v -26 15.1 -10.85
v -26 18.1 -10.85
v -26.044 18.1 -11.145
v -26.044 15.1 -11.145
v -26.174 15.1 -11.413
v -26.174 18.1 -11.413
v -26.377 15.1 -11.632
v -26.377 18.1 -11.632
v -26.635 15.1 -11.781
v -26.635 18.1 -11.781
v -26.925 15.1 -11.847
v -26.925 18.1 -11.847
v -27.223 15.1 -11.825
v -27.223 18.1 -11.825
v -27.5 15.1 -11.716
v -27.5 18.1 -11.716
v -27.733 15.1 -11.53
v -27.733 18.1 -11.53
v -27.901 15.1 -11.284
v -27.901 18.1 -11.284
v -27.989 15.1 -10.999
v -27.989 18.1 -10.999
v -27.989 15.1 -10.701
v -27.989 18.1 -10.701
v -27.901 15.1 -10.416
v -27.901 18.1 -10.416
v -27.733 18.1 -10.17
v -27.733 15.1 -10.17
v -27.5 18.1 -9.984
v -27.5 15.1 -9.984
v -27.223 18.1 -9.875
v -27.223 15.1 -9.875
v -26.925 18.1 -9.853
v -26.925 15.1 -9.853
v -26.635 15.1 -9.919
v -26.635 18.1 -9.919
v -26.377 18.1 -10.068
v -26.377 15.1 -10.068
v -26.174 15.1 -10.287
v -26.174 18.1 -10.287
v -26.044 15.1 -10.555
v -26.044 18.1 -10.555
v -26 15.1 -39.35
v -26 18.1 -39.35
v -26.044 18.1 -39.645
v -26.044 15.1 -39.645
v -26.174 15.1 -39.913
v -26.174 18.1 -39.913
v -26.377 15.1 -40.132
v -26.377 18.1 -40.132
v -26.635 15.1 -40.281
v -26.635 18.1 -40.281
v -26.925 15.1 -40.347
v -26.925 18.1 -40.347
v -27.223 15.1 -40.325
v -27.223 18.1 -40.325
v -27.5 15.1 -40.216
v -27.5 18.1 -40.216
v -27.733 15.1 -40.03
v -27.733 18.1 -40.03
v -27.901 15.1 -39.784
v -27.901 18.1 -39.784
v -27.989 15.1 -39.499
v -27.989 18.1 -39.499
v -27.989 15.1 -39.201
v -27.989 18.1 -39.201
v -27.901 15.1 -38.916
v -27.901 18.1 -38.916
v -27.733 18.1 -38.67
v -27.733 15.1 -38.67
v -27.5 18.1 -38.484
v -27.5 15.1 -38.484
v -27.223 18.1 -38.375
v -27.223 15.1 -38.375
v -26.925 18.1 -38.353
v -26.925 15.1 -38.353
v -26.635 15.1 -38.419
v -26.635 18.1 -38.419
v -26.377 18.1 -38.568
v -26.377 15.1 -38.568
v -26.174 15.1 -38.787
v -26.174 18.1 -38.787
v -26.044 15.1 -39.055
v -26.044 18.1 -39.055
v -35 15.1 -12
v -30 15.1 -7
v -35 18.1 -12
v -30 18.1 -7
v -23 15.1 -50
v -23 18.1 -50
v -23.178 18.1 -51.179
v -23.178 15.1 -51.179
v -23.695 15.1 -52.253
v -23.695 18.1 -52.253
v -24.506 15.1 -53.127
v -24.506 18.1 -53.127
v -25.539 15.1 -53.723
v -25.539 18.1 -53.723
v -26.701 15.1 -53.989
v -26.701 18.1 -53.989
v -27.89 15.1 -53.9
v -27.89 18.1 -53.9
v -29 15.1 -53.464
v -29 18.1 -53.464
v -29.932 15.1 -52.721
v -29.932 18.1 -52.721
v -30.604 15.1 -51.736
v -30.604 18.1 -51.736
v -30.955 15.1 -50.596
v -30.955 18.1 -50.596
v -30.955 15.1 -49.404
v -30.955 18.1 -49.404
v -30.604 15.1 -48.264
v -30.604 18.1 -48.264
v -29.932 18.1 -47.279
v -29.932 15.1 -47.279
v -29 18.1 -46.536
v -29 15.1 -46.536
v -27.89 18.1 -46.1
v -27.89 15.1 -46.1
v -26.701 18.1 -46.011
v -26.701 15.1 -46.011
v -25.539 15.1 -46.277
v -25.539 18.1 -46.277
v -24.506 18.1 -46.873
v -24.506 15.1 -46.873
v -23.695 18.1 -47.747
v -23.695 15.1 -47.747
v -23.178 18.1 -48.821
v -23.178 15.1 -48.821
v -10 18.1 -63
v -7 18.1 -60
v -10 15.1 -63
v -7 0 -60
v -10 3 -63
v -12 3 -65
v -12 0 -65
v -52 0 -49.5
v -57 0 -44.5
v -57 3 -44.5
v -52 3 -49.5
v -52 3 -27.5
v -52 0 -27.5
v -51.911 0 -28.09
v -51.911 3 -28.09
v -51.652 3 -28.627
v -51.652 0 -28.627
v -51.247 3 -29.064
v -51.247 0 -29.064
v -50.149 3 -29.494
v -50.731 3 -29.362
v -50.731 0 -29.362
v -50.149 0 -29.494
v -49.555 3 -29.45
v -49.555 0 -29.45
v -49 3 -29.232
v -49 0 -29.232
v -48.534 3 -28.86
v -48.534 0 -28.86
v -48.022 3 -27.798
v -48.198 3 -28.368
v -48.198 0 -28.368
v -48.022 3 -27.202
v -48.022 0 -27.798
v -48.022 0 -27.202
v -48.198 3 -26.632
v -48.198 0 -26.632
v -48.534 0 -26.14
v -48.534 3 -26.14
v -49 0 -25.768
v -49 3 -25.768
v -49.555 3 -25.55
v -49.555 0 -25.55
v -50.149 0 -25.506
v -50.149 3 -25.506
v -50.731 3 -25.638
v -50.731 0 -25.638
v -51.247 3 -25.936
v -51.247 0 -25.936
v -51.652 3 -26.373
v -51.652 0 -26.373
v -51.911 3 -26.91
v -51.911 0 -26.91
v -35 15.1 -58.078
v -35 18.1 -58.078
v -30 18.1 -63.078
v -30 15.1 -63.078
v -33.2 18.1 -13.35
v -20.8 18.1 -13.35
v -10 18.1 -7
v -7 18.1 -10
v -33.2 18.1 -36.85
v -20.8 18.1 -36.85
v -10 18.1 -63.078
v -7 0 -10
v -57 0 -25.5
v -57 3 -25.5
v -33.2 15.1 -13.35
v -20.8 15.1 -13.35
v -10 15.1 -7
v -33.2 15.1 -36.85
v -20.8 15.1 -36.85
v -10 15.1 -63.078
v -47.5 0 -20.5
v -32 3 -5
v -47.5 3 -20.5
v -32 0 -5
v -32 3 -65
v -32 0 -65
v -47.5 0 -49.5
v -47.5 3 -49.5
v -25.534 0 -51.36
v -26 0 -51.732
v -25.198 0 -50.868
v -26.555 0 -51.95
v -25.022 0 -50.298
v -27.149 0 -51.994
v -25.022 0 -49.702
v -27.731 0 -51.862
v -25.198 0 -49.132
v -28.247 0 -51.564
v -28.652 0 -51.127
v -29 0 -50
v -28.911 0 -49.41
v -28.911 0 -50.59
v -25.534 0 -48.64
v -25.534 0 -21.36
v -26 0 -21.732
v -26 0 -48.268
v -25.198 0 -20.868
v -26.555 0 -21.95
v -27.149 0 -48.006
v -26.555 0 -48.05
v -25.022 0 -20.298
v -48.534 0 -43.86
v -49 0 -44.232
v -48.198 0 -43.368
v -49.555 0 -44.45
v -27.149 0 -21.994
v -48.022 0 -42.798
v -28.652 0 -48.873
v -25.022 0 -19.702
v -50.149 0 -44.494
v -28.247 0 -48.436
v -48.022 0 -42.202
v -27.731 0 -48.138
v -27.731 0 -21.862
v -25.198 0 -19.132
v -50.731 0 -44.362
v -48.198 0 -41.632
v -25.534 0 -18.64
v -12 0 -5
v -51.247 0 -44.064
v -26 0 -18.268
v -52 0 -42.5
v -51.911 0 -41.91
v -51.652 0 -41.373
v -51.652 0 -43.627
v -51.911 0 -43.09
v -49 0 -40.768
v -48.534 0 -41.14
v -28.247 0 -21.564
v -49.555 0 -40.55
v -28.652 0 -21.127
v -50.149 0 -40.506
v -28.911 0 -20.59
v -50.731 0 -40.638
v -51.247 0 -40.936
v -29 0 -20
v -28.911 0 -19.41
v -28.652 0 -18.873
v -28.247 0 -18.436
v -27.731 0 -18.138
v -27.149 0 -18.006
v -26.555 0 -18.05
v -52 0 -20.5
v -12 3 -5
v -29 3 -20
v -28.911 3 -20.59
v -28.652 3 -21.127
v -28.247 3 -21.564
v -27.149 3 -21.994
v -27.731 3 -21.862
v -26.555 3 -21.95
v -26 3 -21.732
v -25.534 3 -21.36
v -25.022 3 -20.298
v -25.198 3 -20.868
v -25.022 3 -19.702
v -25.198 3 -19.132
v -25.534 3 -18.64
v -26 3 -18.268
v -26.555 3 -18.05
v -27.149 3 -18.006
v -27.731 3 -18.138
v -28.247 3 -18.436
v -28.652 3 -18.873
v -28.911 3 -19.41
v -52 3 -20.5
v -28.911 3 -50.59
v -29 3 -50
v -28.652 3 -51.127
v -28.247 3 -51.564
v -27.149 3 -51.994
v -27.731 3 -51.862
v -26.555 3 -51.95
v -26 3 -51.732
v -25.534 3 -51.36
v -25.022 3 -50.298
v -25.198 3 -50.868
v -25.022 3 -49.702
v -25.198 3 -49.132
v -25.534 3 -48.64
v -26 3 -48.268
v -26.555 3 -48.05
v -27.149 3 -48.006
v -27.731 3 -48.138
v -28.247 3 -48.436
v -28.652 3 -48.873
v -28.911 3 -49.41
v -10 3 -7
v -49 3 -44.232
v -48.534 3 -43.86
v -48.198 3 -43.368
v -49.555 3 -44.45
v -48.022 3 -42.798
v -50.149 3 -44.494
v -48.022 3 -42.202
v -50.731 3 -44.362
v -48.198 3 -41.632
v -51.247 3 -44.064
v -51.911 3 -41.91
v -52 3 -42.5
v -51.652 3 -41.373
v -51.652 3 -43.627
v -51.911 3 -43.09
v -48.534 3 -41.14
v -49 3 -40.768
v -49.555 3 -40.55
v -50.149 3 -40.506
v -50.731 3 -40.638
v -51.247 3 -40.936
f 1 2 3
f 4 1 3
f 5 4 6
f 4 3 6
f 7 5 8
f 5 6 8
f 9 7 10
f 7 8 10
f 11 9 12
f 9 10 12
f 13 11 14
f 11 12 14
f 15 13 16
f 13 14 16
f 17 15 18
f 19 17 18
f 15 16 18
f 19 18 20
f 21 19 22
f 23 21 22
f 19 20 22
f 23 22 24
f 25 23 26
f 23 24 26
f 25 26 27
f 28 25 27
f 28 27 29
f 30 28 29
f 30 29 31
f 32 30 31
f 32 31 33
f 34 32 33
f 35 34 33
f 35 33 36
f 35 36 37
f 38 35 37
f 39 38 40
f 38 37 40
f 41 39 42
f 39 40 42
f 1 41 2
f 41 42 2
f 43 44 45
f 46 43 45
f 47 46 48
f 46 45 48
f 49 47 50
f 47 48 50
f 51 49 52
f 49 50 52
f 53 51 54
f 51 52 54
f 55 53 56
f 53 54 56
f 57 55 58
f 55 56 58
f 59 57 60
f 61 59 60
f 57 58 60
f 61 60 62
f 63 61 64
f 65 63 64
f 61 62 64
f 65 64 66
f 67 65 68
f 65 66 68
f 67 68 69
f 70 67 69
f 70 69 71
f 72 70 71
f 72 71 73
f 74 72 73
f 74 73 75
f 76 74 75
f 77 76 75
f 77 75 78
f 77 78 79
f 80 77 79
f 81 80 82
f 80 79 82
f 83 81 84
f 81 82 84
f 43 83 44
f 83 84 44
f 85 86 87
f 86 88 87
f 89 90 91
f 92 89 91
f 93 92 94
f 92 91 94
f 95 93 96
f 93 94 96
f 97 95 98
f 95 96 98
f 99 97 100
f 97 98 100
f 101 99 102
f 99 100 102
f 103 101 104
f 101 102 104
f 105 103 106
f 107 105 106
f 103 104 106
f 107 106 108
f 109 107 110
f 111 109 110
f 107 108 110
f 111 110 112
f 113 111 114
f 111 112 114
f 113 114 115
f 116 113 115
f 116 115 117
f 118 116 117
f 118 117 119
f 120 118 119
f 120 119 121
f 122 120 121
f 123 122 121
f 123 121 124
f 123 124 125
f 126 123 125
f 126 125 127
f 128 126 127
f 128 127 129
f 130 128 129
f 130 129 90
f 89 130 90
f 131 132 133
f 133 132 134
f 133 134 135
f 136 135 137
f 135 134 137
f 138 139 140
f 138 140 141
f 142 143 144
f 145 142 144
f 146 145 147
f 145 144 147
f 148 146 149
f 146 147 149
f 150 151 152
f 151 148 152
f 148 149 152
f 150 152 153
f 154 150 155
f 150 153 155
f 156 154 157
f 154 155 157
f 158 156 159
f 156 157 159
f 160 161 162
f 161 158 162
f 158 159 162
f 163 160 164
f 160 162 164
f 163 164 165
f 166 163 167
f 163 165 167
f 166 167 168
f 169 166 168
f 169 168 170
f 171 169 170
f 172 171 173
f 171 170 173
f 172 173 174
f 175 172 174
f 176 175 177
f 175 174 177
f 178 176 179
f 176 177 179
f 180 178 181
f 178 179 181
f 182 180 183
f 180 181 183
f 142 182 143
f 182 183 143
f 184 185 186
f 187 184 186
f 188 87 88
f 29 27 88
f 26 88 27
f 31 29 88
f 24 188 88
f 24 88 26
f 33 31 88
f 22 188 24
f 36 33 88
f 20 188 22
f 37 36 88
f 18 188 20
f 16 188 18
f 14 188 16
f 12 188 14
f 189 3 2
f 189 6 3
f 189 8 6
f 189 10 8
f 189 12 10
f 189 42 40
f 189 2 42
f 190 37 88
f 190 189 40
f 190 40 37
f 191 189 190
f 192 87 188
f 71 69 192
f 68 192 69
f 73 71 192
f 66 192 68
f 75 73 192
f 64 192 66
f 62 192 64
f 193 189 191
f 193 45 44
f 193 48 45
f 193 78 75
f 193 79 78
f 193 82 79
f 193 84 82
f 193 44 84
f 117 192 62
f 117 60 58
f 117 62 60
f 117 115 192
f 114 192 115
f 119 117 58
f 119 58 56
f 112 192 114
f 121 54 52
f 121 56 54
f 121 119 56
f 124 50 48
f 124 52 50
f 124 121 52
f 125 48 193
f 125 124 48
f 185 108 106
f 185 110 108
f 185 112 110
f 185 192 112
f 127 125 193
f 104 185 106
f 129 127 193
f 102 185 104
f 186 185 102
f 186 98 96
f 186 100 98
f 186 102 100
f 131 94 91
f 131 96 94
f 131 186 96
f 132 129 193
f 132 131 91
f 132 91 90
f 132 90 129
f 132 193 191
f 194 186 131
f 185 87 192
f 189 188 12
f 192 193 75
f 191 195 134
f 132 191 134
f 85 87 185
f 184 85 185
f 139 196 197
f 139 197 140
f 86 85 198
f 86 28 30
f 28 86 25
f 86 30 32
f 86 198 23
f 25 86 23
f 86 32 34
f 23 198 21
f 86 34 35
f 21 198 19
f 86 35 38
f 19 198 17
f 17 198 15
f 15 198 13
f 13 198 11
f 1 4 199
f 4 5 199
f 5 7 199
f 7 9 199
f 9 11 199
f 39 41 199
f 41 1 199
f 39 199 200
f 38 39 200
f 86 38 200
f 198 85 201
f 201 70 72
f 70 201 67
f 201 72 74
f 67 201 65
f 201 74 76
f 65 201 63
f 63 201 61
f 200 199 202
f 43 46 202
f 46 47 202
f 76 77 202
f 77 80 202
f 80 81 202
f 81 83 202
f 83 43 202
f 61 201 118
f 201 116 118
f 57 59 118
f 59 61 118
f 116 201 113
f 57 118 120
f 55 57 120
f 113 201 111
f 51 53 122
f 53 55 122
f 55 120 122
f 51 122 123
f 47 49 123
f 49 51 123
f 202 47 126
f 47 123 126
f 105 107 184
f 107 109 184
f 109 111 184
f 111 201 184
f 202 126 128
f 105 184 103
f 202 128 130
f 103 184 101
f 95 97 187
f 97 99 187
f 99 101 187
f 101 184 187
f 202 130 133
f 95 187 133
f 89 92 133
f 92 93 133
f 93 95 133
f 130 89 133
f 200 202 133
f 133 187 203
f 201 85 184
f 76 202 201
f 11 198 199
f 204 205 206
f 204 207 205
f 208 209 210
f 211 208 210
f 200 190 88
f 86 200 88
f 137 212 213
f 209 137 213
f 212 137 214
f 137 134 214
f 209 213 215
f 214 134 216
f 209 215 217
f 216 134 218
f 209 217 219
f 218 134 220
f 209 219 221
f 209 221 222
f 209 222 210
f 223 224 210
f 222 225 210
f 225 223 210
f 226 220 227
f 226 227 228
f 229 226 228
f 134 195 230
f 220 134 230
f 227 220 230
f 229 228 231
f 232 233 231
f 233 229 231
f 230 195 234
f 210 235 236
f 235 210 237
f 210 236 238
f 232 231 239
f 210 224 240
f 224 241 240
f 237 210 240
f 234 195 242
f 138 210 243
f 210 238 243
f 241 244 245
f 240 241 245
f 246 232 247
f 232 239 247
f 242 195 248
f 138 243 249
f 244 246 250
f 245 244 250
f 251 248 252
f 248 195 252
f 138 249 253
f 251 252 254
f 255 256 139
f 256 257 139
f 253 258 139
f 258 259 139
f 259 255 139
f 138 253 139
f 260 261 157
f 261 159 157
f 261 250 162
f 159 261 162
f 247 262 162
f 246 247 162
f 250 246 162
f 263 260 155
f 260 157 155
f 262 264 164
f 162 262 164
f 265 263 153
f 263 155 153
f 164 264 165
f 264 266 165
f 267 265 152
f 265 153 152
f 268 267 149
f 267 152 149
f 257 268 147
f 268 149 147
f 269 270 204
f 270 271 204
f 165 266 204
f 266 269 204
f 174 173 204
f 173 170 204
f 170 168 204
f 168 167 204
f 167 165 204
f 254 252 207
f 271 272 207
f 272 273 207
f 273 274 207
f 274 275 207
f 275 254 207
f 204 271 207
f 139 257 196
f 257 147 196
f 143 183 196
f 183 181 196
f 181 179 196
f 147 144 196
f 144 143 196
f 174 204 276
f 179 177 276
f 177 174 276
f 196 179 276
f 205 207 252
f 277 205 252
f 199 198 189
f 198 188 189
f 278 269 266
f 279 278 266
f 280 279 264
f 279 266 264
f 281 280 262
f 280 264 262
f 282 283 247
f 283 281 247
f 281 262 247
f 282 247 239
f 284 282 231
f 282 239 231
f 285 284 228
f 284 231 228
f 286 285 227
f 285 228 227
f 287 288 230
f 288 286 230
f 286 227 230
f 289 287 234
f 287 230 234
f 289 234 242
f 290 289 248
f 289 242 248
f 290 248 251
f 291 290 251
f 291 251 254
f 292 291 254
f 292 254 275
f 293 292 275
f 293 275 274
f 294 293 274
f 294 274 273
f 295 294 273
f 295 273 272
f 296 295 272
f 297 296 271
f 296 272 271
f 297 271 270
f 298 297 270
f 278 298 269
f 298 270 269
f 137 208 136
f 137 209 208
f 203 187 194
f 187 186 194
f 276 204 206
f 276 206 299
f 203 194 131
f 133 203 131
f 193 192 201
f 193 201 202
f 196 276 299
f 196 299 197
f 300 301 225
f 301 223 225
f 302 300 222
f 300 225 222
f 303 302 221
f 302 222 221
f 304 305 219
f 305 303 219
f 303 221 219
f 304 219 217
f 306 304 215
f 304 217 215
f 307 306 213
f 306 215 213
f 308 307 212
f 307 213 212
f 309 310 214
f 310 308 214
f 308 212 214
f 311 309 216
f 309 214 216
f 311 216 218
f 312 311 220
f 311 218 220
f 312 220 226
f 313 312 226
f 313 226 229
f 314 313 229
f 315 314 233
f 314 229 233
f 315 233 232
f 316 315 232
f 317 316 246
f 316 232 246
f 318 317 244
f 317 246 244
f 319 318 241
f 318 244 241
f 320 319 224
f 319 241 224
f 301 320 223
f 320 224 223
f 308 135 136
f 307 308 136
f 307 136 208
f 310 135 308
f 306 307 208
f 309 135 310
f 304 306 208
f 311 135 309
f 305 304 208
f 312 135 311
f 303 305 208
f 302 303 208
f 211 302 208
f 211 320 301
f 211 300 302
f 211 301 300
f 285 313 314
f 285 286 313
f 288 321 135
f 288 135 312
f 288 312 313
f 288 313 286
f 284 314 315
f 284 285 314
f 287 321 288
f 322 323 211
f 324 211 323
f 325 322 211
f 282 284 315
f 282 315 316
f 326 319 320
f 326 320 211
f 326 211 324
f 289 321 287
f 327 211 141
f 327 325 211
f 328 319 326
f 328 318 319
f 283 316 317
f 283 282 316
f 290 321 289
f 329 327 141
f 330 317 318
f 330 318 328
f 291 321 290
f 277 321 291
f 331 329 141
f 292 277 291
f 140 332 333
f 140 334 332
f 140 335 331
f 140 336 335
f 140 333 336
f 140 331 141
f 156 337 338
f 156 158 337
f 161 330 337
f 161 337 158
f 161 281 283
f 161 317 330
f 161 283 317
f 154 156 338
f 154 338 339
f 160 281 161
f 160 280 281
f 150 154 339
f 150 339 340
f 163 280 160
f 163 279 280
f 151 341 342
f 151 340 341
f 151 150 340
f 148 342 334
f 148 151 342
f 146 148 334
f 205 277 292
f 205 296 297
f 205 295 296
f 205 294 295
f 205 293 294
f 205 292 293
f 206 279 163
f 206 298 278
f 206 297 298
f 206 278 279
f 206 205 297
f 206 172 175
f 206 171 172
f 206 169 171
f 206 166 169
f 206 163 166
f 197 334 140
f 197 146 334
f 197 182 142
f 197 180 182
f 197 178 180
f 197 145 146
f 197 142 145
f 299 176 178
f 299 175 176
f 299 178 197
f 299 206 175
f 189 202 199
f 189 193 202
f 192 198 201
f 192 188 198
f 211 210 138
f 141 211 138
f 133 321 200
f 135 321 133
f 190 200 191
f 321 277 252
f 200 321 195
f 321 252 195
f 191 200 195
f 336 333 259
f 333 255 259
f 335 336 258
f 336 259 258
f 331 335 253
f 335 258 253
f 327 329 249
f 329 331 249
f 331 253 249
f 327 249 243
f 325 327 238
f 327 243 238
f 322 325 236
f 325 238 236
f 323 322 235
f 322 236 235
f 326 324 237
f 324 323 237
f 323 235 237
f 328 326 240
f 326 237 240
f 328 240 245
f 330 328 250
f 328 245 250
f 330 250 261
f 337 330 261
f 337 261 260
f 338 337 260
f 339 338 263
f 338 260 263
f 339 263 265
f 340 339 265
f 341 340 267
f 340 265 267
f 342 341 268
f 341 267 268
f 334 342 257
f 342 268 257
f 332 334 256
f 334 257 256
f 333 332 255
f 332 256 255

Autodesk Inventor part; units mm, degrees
ref_plane "YZ Plane" through (0, 0, 0) normal (1, 0, 0) x (0, 1, 0)
ref_plane "XZ Plane" through (0, 0, 0) normal (0, 1, 0) x (-1, 0, 0)
ref_plane "XY Plane" through (0, 0, 0) normal (0, 0, 1) x (1, 0, 0)
sketch "Sketch1" plane through (0, 0, 0) normal (0, 1, 0) x (-1, 0, 0)
  line L0 (0, 0) -> (37, 0)
  line L1 (57, -25.5) -> (57, -44.5)
  line L2 (37, -70) -> (0, -70)
  line L3 (0, -60) -> (0, -10)
  circle A0 centre (27, -20) radius 15 construction
  circle A1 centre (27, -50) radius 15 construction
  circle A2 centre (27, -20) radius 2
  circle A3 centre (27, -50) radius 2
  circle A4 centre (50, -27.5) radius 2
  circle A5 centre (50, -42.5) radius 2
  line L4 (50, -27.5) -> (50, -42.5) construction
  line L5 (27, -20) -> (50, -27.5) construction
  line L6 (25, 0) -> (0, -10)
  line L7 (0, -60) -> (25, -70)
  line L8 (37, 0) -> (57, -15)
  line L9 (57, -55) -> (37, -70)
  line L10 (7, -10) -> (7, -60)
  line L11 (43.6667, -5) -> (12, -5)
  line L12 (43.6667, -65) -> (12, -65)
  line L13 (12, -5) -> (7, -10)
  line L14 (7, -60) -> (12, -65)
  line L15 (32, -5) -> (47.5, -20.5)
  line L16 (47.5, -20.5) -> (52, -20.5)
  line L17 (57, -35) -> (0, -35) construction
  line L18 (32, -65) -> (47.5, -49.5)
  line L19 (47.5, -49.5) -> (52, -49.5)
  line L20 (52, -20.5) -> (57, -25.5)
  line L21 (57, -44.5) -> (52, -49.5)
  point P0 (57, -70)
  point P1 (57, 0)
  point P2 (48, 0)
  point P3 (57, -10)
  point P4 (57, -60)
  point P5 (38, -70)
  point P6 (57, -15)
  point P7 (57, -15)
  point P8 (7, -7.2)
  point P9 (7, -62.8)
  point P10 (7, -5)
  point P11 (7, -65)
  point P12 (7, -5)
  point P13 (7, -65)
  point P14 (57, -20.5)
  point P15 (57, -49.5)
  point P16 (32, -65)
  point P17 (57, -49.5)
  point P18 (57, -20.5)
  point P19 (57, -49.5)
  dimension "d47" = 0
  dimension "d0" = 57
  dimension "d7" = 30
  dimension "d8" = 30
  dimension "d12" = 4
  dimension "d13" = 4
  dimension "d17" = 4
  dimension "d18" = 4
  dimension "d19" = 15
  dimension "d21" = 7
  dimension "d36" = 27.5
  dimension "d38" = 25
  dimension "d40" = 25
  dimension "d52" = 30
  dimension "d90" = 15
  dimension "d91" = 20
  dimension "d92" = 15
  dimension "d93" = 20
  dimension "d124" = 70
  dimension "d132" = 7
  dimension "d133" = 5
  dimension "d134" = 5
  dimension "d135" = 5
  dimension "d136" = 5
  dimension "d137" = 5
  dimension "d138" = 5
  dimension "d139" = 45
  dimension "d140" = 15.5
  dimension "d141" = 7
  dimension "d142" = 5
  dimension "d143" = 5
  dimension "d144" = 5
  dimension "d145" = 5
  dimension "d146" = 25
  dimension "d165" = 15
extrude "Extrusion1" add sketch "Sketch1" along normal blind 3 contours L11 L15 L16 L20 L1 L21 L19 L18 L12 L7 L14 L10 L13 L6 | L6 L13 L11 | L7 L12 L14
sketch "Sketch4" plane through (0, 3, 0) normal (0, 1, 0) x (1, 0, 0)
  line L0 (-33.2, 8.95) -> (-33.2, 41.25)
  line L1 (-33.2, 41.25) -> (-20.8, 41.25)
  line L2 (-20.8, 41.25) -> (-20.8, 8.95)
  line L3 (-20.8, 8.95) -> (-33.2, 8.95)
  line L4 (-33.2, 13.35) -> (-20.8, 13.35)
  line L5 (-33.2, 36.85) -> (-20.8, 36.85)
  circle A0 centre (-27, 20) radius 2.45
  circle A1 centre (-27, 20) radius 2 projected
  circle A2 centre (-27, 20) radius 16.1 construction
  circle A3 centre (-27, 50) radius 2 projected
  circle A4 centre (-27, 50) radius 16.1 construction
  line L6 (-27, 8.95) -> (-27, 13.35) construction
  line L7 (-27, 41.25) -> (-27, 36.85) construction
  circle A5 centre (-27, 10.85) radius 1
  circle A6 centre (-27, 39.35) radius 1
  circle A7 centre (-27, 20) radius 2 projected
  circle A8 centre (-27, 20) radius 9.85 construction
  line L8 (-57, 44.5) -> (-57, 25.5) projected
  line L9 (-32, 5) -> (-12, 5) projected
  line L10 (-12, 65) -> (-32, 65) projected
  line L11 (-12, 5) -> (-10, 7) projected
  line L12 (-10, 63) -> (-12, 65) projected
  line L13 (-32, 65) -> (-47.5, 49.5) projected
  line L14 (-47.5, 49.5) -> (-52, 49.5) projected
  line L15 (-52, 20.5) -> (-47.5, 20.5) projected
  line L16 (-47.5, 20.5) -> (-32, 5) projected
  line L17 (-52, 49.5) -> (-57, 44.5) projected
  line L18 (-57, 25.5) -> (-52, 20.5) projected
  line L19 (-10, 7) -> (-10, 63) projected
  point P0 (0, 0)
  point P1 (-22.9289, 0)
  point P2 (-27.9289, 0)
  dimension "d22" = 32.3
  dimension "d23" = 12.4
  dimension "d24" = 4.4
  dimension "d25" = 4.4
  dimension "d27" = 6.2
  dimension "d28" = 11.05
  dimension "d49" = 32.2
  dimension "d50" = 32.2
  dimension "d53" = 4.9
  dimension "d54" = 2.2
  dimension "d57" = 2
  dimension "d58" = 2
  dimension "d59" = 1.9
  dimension "d60" = 1.9
  dimension "d87" = 19.7
sketch "Sketch10" plane through (0, 3, 0) normal (0, 1, 0) x (1, 0, 0)
  line L0 (-12, 5) -> (-7, 10) projected
  line L1 (-10, 7) -> (-10, 63)
  line L2 (-7, 60) -> (-12, 65) projected
  line L3 (-7, 10) -> (-7, 60) projected
  line L4 (-7, 60) -> (-12, 65) projected
  line L5 (-47.5, 20.5) -> (-32, 5) projected
  line L6 (-32, 65) -> (-47.5, 49.5) projected
  line L7 (-32, 5) -> (-12, 5) projected
  line L8 (-12, 65) -> (-32, 65) projected
  line L9 (-12, 65) -> (-32, 65) projected
  point P0 (0, 0)
  dimension "d147" = 3
extrude "Extrusion7" add sketch "Sketch10" along normal blind 15.1
sketch "Sketch11" plane through (0, 18.1, 0) normal (0, 1, 0) x (1, 0, 0)
  line L0 (-12, 5) -> (-10, 7) projected
  line L1 (-10, 7) -> (-30, 7)
  line L2 (-35, 12) -> (-35, 58.0775)
  line L3 (-30, 63.0775) -> (-10, 63.0775)
  line L4 (-10, 63.0775) -> (-10, 7)
  line L5 (-30, 7) -> (-35, 12)
  line L6 (-35, 58.0775) -> (-30, 63.0775)
  circle A0 centre (-27, 10.85) radius 1 projected
  circle A1 centre (-27, 39.35) radius 1 projected
  line L7 (-20.8, 8.95) -> (-33.2, 8.95) projected
  line L8 (-33.2, 8.95) -> (-33.2, 41.25) projected
  line L9 (-33.2, 36.85) -> (-20.8, 36.85) projected
  line L10 (-33.2, 41.25) -> (-20.8, 41.25) projected
  line L11 (-20.8, 41.25) -> (-20.8, 8.95) projected
  line L12 (-33.2, 13.35) -> (-20.8, 13.35) projected
  circle A2 centre (-27, 50) radius 2 projected
  circle A3 centre (-27, 50) radius 4
  point P0 (0, 0)
  point P1 (-35, 63.0775)
  point P2 (-35, 7)
  dimension "d150" = 25
  dimension "d151" = 56.0775
  dimension "d152" = 5
  dimension "d153" = 5
  dimension "d154" = 5
  dimension "d155" = 5
  dimension "d156" = 8
extrude "Extrusion8" add sketch "Sketch11" against normal blind 3 contours L1 L5 L7 L11 L10 L8 L2 L6 L3 L4 | L5 L8 L12 L11 L7 | L8 L10 L11 L9
properties part number "base 2.0 upload"
